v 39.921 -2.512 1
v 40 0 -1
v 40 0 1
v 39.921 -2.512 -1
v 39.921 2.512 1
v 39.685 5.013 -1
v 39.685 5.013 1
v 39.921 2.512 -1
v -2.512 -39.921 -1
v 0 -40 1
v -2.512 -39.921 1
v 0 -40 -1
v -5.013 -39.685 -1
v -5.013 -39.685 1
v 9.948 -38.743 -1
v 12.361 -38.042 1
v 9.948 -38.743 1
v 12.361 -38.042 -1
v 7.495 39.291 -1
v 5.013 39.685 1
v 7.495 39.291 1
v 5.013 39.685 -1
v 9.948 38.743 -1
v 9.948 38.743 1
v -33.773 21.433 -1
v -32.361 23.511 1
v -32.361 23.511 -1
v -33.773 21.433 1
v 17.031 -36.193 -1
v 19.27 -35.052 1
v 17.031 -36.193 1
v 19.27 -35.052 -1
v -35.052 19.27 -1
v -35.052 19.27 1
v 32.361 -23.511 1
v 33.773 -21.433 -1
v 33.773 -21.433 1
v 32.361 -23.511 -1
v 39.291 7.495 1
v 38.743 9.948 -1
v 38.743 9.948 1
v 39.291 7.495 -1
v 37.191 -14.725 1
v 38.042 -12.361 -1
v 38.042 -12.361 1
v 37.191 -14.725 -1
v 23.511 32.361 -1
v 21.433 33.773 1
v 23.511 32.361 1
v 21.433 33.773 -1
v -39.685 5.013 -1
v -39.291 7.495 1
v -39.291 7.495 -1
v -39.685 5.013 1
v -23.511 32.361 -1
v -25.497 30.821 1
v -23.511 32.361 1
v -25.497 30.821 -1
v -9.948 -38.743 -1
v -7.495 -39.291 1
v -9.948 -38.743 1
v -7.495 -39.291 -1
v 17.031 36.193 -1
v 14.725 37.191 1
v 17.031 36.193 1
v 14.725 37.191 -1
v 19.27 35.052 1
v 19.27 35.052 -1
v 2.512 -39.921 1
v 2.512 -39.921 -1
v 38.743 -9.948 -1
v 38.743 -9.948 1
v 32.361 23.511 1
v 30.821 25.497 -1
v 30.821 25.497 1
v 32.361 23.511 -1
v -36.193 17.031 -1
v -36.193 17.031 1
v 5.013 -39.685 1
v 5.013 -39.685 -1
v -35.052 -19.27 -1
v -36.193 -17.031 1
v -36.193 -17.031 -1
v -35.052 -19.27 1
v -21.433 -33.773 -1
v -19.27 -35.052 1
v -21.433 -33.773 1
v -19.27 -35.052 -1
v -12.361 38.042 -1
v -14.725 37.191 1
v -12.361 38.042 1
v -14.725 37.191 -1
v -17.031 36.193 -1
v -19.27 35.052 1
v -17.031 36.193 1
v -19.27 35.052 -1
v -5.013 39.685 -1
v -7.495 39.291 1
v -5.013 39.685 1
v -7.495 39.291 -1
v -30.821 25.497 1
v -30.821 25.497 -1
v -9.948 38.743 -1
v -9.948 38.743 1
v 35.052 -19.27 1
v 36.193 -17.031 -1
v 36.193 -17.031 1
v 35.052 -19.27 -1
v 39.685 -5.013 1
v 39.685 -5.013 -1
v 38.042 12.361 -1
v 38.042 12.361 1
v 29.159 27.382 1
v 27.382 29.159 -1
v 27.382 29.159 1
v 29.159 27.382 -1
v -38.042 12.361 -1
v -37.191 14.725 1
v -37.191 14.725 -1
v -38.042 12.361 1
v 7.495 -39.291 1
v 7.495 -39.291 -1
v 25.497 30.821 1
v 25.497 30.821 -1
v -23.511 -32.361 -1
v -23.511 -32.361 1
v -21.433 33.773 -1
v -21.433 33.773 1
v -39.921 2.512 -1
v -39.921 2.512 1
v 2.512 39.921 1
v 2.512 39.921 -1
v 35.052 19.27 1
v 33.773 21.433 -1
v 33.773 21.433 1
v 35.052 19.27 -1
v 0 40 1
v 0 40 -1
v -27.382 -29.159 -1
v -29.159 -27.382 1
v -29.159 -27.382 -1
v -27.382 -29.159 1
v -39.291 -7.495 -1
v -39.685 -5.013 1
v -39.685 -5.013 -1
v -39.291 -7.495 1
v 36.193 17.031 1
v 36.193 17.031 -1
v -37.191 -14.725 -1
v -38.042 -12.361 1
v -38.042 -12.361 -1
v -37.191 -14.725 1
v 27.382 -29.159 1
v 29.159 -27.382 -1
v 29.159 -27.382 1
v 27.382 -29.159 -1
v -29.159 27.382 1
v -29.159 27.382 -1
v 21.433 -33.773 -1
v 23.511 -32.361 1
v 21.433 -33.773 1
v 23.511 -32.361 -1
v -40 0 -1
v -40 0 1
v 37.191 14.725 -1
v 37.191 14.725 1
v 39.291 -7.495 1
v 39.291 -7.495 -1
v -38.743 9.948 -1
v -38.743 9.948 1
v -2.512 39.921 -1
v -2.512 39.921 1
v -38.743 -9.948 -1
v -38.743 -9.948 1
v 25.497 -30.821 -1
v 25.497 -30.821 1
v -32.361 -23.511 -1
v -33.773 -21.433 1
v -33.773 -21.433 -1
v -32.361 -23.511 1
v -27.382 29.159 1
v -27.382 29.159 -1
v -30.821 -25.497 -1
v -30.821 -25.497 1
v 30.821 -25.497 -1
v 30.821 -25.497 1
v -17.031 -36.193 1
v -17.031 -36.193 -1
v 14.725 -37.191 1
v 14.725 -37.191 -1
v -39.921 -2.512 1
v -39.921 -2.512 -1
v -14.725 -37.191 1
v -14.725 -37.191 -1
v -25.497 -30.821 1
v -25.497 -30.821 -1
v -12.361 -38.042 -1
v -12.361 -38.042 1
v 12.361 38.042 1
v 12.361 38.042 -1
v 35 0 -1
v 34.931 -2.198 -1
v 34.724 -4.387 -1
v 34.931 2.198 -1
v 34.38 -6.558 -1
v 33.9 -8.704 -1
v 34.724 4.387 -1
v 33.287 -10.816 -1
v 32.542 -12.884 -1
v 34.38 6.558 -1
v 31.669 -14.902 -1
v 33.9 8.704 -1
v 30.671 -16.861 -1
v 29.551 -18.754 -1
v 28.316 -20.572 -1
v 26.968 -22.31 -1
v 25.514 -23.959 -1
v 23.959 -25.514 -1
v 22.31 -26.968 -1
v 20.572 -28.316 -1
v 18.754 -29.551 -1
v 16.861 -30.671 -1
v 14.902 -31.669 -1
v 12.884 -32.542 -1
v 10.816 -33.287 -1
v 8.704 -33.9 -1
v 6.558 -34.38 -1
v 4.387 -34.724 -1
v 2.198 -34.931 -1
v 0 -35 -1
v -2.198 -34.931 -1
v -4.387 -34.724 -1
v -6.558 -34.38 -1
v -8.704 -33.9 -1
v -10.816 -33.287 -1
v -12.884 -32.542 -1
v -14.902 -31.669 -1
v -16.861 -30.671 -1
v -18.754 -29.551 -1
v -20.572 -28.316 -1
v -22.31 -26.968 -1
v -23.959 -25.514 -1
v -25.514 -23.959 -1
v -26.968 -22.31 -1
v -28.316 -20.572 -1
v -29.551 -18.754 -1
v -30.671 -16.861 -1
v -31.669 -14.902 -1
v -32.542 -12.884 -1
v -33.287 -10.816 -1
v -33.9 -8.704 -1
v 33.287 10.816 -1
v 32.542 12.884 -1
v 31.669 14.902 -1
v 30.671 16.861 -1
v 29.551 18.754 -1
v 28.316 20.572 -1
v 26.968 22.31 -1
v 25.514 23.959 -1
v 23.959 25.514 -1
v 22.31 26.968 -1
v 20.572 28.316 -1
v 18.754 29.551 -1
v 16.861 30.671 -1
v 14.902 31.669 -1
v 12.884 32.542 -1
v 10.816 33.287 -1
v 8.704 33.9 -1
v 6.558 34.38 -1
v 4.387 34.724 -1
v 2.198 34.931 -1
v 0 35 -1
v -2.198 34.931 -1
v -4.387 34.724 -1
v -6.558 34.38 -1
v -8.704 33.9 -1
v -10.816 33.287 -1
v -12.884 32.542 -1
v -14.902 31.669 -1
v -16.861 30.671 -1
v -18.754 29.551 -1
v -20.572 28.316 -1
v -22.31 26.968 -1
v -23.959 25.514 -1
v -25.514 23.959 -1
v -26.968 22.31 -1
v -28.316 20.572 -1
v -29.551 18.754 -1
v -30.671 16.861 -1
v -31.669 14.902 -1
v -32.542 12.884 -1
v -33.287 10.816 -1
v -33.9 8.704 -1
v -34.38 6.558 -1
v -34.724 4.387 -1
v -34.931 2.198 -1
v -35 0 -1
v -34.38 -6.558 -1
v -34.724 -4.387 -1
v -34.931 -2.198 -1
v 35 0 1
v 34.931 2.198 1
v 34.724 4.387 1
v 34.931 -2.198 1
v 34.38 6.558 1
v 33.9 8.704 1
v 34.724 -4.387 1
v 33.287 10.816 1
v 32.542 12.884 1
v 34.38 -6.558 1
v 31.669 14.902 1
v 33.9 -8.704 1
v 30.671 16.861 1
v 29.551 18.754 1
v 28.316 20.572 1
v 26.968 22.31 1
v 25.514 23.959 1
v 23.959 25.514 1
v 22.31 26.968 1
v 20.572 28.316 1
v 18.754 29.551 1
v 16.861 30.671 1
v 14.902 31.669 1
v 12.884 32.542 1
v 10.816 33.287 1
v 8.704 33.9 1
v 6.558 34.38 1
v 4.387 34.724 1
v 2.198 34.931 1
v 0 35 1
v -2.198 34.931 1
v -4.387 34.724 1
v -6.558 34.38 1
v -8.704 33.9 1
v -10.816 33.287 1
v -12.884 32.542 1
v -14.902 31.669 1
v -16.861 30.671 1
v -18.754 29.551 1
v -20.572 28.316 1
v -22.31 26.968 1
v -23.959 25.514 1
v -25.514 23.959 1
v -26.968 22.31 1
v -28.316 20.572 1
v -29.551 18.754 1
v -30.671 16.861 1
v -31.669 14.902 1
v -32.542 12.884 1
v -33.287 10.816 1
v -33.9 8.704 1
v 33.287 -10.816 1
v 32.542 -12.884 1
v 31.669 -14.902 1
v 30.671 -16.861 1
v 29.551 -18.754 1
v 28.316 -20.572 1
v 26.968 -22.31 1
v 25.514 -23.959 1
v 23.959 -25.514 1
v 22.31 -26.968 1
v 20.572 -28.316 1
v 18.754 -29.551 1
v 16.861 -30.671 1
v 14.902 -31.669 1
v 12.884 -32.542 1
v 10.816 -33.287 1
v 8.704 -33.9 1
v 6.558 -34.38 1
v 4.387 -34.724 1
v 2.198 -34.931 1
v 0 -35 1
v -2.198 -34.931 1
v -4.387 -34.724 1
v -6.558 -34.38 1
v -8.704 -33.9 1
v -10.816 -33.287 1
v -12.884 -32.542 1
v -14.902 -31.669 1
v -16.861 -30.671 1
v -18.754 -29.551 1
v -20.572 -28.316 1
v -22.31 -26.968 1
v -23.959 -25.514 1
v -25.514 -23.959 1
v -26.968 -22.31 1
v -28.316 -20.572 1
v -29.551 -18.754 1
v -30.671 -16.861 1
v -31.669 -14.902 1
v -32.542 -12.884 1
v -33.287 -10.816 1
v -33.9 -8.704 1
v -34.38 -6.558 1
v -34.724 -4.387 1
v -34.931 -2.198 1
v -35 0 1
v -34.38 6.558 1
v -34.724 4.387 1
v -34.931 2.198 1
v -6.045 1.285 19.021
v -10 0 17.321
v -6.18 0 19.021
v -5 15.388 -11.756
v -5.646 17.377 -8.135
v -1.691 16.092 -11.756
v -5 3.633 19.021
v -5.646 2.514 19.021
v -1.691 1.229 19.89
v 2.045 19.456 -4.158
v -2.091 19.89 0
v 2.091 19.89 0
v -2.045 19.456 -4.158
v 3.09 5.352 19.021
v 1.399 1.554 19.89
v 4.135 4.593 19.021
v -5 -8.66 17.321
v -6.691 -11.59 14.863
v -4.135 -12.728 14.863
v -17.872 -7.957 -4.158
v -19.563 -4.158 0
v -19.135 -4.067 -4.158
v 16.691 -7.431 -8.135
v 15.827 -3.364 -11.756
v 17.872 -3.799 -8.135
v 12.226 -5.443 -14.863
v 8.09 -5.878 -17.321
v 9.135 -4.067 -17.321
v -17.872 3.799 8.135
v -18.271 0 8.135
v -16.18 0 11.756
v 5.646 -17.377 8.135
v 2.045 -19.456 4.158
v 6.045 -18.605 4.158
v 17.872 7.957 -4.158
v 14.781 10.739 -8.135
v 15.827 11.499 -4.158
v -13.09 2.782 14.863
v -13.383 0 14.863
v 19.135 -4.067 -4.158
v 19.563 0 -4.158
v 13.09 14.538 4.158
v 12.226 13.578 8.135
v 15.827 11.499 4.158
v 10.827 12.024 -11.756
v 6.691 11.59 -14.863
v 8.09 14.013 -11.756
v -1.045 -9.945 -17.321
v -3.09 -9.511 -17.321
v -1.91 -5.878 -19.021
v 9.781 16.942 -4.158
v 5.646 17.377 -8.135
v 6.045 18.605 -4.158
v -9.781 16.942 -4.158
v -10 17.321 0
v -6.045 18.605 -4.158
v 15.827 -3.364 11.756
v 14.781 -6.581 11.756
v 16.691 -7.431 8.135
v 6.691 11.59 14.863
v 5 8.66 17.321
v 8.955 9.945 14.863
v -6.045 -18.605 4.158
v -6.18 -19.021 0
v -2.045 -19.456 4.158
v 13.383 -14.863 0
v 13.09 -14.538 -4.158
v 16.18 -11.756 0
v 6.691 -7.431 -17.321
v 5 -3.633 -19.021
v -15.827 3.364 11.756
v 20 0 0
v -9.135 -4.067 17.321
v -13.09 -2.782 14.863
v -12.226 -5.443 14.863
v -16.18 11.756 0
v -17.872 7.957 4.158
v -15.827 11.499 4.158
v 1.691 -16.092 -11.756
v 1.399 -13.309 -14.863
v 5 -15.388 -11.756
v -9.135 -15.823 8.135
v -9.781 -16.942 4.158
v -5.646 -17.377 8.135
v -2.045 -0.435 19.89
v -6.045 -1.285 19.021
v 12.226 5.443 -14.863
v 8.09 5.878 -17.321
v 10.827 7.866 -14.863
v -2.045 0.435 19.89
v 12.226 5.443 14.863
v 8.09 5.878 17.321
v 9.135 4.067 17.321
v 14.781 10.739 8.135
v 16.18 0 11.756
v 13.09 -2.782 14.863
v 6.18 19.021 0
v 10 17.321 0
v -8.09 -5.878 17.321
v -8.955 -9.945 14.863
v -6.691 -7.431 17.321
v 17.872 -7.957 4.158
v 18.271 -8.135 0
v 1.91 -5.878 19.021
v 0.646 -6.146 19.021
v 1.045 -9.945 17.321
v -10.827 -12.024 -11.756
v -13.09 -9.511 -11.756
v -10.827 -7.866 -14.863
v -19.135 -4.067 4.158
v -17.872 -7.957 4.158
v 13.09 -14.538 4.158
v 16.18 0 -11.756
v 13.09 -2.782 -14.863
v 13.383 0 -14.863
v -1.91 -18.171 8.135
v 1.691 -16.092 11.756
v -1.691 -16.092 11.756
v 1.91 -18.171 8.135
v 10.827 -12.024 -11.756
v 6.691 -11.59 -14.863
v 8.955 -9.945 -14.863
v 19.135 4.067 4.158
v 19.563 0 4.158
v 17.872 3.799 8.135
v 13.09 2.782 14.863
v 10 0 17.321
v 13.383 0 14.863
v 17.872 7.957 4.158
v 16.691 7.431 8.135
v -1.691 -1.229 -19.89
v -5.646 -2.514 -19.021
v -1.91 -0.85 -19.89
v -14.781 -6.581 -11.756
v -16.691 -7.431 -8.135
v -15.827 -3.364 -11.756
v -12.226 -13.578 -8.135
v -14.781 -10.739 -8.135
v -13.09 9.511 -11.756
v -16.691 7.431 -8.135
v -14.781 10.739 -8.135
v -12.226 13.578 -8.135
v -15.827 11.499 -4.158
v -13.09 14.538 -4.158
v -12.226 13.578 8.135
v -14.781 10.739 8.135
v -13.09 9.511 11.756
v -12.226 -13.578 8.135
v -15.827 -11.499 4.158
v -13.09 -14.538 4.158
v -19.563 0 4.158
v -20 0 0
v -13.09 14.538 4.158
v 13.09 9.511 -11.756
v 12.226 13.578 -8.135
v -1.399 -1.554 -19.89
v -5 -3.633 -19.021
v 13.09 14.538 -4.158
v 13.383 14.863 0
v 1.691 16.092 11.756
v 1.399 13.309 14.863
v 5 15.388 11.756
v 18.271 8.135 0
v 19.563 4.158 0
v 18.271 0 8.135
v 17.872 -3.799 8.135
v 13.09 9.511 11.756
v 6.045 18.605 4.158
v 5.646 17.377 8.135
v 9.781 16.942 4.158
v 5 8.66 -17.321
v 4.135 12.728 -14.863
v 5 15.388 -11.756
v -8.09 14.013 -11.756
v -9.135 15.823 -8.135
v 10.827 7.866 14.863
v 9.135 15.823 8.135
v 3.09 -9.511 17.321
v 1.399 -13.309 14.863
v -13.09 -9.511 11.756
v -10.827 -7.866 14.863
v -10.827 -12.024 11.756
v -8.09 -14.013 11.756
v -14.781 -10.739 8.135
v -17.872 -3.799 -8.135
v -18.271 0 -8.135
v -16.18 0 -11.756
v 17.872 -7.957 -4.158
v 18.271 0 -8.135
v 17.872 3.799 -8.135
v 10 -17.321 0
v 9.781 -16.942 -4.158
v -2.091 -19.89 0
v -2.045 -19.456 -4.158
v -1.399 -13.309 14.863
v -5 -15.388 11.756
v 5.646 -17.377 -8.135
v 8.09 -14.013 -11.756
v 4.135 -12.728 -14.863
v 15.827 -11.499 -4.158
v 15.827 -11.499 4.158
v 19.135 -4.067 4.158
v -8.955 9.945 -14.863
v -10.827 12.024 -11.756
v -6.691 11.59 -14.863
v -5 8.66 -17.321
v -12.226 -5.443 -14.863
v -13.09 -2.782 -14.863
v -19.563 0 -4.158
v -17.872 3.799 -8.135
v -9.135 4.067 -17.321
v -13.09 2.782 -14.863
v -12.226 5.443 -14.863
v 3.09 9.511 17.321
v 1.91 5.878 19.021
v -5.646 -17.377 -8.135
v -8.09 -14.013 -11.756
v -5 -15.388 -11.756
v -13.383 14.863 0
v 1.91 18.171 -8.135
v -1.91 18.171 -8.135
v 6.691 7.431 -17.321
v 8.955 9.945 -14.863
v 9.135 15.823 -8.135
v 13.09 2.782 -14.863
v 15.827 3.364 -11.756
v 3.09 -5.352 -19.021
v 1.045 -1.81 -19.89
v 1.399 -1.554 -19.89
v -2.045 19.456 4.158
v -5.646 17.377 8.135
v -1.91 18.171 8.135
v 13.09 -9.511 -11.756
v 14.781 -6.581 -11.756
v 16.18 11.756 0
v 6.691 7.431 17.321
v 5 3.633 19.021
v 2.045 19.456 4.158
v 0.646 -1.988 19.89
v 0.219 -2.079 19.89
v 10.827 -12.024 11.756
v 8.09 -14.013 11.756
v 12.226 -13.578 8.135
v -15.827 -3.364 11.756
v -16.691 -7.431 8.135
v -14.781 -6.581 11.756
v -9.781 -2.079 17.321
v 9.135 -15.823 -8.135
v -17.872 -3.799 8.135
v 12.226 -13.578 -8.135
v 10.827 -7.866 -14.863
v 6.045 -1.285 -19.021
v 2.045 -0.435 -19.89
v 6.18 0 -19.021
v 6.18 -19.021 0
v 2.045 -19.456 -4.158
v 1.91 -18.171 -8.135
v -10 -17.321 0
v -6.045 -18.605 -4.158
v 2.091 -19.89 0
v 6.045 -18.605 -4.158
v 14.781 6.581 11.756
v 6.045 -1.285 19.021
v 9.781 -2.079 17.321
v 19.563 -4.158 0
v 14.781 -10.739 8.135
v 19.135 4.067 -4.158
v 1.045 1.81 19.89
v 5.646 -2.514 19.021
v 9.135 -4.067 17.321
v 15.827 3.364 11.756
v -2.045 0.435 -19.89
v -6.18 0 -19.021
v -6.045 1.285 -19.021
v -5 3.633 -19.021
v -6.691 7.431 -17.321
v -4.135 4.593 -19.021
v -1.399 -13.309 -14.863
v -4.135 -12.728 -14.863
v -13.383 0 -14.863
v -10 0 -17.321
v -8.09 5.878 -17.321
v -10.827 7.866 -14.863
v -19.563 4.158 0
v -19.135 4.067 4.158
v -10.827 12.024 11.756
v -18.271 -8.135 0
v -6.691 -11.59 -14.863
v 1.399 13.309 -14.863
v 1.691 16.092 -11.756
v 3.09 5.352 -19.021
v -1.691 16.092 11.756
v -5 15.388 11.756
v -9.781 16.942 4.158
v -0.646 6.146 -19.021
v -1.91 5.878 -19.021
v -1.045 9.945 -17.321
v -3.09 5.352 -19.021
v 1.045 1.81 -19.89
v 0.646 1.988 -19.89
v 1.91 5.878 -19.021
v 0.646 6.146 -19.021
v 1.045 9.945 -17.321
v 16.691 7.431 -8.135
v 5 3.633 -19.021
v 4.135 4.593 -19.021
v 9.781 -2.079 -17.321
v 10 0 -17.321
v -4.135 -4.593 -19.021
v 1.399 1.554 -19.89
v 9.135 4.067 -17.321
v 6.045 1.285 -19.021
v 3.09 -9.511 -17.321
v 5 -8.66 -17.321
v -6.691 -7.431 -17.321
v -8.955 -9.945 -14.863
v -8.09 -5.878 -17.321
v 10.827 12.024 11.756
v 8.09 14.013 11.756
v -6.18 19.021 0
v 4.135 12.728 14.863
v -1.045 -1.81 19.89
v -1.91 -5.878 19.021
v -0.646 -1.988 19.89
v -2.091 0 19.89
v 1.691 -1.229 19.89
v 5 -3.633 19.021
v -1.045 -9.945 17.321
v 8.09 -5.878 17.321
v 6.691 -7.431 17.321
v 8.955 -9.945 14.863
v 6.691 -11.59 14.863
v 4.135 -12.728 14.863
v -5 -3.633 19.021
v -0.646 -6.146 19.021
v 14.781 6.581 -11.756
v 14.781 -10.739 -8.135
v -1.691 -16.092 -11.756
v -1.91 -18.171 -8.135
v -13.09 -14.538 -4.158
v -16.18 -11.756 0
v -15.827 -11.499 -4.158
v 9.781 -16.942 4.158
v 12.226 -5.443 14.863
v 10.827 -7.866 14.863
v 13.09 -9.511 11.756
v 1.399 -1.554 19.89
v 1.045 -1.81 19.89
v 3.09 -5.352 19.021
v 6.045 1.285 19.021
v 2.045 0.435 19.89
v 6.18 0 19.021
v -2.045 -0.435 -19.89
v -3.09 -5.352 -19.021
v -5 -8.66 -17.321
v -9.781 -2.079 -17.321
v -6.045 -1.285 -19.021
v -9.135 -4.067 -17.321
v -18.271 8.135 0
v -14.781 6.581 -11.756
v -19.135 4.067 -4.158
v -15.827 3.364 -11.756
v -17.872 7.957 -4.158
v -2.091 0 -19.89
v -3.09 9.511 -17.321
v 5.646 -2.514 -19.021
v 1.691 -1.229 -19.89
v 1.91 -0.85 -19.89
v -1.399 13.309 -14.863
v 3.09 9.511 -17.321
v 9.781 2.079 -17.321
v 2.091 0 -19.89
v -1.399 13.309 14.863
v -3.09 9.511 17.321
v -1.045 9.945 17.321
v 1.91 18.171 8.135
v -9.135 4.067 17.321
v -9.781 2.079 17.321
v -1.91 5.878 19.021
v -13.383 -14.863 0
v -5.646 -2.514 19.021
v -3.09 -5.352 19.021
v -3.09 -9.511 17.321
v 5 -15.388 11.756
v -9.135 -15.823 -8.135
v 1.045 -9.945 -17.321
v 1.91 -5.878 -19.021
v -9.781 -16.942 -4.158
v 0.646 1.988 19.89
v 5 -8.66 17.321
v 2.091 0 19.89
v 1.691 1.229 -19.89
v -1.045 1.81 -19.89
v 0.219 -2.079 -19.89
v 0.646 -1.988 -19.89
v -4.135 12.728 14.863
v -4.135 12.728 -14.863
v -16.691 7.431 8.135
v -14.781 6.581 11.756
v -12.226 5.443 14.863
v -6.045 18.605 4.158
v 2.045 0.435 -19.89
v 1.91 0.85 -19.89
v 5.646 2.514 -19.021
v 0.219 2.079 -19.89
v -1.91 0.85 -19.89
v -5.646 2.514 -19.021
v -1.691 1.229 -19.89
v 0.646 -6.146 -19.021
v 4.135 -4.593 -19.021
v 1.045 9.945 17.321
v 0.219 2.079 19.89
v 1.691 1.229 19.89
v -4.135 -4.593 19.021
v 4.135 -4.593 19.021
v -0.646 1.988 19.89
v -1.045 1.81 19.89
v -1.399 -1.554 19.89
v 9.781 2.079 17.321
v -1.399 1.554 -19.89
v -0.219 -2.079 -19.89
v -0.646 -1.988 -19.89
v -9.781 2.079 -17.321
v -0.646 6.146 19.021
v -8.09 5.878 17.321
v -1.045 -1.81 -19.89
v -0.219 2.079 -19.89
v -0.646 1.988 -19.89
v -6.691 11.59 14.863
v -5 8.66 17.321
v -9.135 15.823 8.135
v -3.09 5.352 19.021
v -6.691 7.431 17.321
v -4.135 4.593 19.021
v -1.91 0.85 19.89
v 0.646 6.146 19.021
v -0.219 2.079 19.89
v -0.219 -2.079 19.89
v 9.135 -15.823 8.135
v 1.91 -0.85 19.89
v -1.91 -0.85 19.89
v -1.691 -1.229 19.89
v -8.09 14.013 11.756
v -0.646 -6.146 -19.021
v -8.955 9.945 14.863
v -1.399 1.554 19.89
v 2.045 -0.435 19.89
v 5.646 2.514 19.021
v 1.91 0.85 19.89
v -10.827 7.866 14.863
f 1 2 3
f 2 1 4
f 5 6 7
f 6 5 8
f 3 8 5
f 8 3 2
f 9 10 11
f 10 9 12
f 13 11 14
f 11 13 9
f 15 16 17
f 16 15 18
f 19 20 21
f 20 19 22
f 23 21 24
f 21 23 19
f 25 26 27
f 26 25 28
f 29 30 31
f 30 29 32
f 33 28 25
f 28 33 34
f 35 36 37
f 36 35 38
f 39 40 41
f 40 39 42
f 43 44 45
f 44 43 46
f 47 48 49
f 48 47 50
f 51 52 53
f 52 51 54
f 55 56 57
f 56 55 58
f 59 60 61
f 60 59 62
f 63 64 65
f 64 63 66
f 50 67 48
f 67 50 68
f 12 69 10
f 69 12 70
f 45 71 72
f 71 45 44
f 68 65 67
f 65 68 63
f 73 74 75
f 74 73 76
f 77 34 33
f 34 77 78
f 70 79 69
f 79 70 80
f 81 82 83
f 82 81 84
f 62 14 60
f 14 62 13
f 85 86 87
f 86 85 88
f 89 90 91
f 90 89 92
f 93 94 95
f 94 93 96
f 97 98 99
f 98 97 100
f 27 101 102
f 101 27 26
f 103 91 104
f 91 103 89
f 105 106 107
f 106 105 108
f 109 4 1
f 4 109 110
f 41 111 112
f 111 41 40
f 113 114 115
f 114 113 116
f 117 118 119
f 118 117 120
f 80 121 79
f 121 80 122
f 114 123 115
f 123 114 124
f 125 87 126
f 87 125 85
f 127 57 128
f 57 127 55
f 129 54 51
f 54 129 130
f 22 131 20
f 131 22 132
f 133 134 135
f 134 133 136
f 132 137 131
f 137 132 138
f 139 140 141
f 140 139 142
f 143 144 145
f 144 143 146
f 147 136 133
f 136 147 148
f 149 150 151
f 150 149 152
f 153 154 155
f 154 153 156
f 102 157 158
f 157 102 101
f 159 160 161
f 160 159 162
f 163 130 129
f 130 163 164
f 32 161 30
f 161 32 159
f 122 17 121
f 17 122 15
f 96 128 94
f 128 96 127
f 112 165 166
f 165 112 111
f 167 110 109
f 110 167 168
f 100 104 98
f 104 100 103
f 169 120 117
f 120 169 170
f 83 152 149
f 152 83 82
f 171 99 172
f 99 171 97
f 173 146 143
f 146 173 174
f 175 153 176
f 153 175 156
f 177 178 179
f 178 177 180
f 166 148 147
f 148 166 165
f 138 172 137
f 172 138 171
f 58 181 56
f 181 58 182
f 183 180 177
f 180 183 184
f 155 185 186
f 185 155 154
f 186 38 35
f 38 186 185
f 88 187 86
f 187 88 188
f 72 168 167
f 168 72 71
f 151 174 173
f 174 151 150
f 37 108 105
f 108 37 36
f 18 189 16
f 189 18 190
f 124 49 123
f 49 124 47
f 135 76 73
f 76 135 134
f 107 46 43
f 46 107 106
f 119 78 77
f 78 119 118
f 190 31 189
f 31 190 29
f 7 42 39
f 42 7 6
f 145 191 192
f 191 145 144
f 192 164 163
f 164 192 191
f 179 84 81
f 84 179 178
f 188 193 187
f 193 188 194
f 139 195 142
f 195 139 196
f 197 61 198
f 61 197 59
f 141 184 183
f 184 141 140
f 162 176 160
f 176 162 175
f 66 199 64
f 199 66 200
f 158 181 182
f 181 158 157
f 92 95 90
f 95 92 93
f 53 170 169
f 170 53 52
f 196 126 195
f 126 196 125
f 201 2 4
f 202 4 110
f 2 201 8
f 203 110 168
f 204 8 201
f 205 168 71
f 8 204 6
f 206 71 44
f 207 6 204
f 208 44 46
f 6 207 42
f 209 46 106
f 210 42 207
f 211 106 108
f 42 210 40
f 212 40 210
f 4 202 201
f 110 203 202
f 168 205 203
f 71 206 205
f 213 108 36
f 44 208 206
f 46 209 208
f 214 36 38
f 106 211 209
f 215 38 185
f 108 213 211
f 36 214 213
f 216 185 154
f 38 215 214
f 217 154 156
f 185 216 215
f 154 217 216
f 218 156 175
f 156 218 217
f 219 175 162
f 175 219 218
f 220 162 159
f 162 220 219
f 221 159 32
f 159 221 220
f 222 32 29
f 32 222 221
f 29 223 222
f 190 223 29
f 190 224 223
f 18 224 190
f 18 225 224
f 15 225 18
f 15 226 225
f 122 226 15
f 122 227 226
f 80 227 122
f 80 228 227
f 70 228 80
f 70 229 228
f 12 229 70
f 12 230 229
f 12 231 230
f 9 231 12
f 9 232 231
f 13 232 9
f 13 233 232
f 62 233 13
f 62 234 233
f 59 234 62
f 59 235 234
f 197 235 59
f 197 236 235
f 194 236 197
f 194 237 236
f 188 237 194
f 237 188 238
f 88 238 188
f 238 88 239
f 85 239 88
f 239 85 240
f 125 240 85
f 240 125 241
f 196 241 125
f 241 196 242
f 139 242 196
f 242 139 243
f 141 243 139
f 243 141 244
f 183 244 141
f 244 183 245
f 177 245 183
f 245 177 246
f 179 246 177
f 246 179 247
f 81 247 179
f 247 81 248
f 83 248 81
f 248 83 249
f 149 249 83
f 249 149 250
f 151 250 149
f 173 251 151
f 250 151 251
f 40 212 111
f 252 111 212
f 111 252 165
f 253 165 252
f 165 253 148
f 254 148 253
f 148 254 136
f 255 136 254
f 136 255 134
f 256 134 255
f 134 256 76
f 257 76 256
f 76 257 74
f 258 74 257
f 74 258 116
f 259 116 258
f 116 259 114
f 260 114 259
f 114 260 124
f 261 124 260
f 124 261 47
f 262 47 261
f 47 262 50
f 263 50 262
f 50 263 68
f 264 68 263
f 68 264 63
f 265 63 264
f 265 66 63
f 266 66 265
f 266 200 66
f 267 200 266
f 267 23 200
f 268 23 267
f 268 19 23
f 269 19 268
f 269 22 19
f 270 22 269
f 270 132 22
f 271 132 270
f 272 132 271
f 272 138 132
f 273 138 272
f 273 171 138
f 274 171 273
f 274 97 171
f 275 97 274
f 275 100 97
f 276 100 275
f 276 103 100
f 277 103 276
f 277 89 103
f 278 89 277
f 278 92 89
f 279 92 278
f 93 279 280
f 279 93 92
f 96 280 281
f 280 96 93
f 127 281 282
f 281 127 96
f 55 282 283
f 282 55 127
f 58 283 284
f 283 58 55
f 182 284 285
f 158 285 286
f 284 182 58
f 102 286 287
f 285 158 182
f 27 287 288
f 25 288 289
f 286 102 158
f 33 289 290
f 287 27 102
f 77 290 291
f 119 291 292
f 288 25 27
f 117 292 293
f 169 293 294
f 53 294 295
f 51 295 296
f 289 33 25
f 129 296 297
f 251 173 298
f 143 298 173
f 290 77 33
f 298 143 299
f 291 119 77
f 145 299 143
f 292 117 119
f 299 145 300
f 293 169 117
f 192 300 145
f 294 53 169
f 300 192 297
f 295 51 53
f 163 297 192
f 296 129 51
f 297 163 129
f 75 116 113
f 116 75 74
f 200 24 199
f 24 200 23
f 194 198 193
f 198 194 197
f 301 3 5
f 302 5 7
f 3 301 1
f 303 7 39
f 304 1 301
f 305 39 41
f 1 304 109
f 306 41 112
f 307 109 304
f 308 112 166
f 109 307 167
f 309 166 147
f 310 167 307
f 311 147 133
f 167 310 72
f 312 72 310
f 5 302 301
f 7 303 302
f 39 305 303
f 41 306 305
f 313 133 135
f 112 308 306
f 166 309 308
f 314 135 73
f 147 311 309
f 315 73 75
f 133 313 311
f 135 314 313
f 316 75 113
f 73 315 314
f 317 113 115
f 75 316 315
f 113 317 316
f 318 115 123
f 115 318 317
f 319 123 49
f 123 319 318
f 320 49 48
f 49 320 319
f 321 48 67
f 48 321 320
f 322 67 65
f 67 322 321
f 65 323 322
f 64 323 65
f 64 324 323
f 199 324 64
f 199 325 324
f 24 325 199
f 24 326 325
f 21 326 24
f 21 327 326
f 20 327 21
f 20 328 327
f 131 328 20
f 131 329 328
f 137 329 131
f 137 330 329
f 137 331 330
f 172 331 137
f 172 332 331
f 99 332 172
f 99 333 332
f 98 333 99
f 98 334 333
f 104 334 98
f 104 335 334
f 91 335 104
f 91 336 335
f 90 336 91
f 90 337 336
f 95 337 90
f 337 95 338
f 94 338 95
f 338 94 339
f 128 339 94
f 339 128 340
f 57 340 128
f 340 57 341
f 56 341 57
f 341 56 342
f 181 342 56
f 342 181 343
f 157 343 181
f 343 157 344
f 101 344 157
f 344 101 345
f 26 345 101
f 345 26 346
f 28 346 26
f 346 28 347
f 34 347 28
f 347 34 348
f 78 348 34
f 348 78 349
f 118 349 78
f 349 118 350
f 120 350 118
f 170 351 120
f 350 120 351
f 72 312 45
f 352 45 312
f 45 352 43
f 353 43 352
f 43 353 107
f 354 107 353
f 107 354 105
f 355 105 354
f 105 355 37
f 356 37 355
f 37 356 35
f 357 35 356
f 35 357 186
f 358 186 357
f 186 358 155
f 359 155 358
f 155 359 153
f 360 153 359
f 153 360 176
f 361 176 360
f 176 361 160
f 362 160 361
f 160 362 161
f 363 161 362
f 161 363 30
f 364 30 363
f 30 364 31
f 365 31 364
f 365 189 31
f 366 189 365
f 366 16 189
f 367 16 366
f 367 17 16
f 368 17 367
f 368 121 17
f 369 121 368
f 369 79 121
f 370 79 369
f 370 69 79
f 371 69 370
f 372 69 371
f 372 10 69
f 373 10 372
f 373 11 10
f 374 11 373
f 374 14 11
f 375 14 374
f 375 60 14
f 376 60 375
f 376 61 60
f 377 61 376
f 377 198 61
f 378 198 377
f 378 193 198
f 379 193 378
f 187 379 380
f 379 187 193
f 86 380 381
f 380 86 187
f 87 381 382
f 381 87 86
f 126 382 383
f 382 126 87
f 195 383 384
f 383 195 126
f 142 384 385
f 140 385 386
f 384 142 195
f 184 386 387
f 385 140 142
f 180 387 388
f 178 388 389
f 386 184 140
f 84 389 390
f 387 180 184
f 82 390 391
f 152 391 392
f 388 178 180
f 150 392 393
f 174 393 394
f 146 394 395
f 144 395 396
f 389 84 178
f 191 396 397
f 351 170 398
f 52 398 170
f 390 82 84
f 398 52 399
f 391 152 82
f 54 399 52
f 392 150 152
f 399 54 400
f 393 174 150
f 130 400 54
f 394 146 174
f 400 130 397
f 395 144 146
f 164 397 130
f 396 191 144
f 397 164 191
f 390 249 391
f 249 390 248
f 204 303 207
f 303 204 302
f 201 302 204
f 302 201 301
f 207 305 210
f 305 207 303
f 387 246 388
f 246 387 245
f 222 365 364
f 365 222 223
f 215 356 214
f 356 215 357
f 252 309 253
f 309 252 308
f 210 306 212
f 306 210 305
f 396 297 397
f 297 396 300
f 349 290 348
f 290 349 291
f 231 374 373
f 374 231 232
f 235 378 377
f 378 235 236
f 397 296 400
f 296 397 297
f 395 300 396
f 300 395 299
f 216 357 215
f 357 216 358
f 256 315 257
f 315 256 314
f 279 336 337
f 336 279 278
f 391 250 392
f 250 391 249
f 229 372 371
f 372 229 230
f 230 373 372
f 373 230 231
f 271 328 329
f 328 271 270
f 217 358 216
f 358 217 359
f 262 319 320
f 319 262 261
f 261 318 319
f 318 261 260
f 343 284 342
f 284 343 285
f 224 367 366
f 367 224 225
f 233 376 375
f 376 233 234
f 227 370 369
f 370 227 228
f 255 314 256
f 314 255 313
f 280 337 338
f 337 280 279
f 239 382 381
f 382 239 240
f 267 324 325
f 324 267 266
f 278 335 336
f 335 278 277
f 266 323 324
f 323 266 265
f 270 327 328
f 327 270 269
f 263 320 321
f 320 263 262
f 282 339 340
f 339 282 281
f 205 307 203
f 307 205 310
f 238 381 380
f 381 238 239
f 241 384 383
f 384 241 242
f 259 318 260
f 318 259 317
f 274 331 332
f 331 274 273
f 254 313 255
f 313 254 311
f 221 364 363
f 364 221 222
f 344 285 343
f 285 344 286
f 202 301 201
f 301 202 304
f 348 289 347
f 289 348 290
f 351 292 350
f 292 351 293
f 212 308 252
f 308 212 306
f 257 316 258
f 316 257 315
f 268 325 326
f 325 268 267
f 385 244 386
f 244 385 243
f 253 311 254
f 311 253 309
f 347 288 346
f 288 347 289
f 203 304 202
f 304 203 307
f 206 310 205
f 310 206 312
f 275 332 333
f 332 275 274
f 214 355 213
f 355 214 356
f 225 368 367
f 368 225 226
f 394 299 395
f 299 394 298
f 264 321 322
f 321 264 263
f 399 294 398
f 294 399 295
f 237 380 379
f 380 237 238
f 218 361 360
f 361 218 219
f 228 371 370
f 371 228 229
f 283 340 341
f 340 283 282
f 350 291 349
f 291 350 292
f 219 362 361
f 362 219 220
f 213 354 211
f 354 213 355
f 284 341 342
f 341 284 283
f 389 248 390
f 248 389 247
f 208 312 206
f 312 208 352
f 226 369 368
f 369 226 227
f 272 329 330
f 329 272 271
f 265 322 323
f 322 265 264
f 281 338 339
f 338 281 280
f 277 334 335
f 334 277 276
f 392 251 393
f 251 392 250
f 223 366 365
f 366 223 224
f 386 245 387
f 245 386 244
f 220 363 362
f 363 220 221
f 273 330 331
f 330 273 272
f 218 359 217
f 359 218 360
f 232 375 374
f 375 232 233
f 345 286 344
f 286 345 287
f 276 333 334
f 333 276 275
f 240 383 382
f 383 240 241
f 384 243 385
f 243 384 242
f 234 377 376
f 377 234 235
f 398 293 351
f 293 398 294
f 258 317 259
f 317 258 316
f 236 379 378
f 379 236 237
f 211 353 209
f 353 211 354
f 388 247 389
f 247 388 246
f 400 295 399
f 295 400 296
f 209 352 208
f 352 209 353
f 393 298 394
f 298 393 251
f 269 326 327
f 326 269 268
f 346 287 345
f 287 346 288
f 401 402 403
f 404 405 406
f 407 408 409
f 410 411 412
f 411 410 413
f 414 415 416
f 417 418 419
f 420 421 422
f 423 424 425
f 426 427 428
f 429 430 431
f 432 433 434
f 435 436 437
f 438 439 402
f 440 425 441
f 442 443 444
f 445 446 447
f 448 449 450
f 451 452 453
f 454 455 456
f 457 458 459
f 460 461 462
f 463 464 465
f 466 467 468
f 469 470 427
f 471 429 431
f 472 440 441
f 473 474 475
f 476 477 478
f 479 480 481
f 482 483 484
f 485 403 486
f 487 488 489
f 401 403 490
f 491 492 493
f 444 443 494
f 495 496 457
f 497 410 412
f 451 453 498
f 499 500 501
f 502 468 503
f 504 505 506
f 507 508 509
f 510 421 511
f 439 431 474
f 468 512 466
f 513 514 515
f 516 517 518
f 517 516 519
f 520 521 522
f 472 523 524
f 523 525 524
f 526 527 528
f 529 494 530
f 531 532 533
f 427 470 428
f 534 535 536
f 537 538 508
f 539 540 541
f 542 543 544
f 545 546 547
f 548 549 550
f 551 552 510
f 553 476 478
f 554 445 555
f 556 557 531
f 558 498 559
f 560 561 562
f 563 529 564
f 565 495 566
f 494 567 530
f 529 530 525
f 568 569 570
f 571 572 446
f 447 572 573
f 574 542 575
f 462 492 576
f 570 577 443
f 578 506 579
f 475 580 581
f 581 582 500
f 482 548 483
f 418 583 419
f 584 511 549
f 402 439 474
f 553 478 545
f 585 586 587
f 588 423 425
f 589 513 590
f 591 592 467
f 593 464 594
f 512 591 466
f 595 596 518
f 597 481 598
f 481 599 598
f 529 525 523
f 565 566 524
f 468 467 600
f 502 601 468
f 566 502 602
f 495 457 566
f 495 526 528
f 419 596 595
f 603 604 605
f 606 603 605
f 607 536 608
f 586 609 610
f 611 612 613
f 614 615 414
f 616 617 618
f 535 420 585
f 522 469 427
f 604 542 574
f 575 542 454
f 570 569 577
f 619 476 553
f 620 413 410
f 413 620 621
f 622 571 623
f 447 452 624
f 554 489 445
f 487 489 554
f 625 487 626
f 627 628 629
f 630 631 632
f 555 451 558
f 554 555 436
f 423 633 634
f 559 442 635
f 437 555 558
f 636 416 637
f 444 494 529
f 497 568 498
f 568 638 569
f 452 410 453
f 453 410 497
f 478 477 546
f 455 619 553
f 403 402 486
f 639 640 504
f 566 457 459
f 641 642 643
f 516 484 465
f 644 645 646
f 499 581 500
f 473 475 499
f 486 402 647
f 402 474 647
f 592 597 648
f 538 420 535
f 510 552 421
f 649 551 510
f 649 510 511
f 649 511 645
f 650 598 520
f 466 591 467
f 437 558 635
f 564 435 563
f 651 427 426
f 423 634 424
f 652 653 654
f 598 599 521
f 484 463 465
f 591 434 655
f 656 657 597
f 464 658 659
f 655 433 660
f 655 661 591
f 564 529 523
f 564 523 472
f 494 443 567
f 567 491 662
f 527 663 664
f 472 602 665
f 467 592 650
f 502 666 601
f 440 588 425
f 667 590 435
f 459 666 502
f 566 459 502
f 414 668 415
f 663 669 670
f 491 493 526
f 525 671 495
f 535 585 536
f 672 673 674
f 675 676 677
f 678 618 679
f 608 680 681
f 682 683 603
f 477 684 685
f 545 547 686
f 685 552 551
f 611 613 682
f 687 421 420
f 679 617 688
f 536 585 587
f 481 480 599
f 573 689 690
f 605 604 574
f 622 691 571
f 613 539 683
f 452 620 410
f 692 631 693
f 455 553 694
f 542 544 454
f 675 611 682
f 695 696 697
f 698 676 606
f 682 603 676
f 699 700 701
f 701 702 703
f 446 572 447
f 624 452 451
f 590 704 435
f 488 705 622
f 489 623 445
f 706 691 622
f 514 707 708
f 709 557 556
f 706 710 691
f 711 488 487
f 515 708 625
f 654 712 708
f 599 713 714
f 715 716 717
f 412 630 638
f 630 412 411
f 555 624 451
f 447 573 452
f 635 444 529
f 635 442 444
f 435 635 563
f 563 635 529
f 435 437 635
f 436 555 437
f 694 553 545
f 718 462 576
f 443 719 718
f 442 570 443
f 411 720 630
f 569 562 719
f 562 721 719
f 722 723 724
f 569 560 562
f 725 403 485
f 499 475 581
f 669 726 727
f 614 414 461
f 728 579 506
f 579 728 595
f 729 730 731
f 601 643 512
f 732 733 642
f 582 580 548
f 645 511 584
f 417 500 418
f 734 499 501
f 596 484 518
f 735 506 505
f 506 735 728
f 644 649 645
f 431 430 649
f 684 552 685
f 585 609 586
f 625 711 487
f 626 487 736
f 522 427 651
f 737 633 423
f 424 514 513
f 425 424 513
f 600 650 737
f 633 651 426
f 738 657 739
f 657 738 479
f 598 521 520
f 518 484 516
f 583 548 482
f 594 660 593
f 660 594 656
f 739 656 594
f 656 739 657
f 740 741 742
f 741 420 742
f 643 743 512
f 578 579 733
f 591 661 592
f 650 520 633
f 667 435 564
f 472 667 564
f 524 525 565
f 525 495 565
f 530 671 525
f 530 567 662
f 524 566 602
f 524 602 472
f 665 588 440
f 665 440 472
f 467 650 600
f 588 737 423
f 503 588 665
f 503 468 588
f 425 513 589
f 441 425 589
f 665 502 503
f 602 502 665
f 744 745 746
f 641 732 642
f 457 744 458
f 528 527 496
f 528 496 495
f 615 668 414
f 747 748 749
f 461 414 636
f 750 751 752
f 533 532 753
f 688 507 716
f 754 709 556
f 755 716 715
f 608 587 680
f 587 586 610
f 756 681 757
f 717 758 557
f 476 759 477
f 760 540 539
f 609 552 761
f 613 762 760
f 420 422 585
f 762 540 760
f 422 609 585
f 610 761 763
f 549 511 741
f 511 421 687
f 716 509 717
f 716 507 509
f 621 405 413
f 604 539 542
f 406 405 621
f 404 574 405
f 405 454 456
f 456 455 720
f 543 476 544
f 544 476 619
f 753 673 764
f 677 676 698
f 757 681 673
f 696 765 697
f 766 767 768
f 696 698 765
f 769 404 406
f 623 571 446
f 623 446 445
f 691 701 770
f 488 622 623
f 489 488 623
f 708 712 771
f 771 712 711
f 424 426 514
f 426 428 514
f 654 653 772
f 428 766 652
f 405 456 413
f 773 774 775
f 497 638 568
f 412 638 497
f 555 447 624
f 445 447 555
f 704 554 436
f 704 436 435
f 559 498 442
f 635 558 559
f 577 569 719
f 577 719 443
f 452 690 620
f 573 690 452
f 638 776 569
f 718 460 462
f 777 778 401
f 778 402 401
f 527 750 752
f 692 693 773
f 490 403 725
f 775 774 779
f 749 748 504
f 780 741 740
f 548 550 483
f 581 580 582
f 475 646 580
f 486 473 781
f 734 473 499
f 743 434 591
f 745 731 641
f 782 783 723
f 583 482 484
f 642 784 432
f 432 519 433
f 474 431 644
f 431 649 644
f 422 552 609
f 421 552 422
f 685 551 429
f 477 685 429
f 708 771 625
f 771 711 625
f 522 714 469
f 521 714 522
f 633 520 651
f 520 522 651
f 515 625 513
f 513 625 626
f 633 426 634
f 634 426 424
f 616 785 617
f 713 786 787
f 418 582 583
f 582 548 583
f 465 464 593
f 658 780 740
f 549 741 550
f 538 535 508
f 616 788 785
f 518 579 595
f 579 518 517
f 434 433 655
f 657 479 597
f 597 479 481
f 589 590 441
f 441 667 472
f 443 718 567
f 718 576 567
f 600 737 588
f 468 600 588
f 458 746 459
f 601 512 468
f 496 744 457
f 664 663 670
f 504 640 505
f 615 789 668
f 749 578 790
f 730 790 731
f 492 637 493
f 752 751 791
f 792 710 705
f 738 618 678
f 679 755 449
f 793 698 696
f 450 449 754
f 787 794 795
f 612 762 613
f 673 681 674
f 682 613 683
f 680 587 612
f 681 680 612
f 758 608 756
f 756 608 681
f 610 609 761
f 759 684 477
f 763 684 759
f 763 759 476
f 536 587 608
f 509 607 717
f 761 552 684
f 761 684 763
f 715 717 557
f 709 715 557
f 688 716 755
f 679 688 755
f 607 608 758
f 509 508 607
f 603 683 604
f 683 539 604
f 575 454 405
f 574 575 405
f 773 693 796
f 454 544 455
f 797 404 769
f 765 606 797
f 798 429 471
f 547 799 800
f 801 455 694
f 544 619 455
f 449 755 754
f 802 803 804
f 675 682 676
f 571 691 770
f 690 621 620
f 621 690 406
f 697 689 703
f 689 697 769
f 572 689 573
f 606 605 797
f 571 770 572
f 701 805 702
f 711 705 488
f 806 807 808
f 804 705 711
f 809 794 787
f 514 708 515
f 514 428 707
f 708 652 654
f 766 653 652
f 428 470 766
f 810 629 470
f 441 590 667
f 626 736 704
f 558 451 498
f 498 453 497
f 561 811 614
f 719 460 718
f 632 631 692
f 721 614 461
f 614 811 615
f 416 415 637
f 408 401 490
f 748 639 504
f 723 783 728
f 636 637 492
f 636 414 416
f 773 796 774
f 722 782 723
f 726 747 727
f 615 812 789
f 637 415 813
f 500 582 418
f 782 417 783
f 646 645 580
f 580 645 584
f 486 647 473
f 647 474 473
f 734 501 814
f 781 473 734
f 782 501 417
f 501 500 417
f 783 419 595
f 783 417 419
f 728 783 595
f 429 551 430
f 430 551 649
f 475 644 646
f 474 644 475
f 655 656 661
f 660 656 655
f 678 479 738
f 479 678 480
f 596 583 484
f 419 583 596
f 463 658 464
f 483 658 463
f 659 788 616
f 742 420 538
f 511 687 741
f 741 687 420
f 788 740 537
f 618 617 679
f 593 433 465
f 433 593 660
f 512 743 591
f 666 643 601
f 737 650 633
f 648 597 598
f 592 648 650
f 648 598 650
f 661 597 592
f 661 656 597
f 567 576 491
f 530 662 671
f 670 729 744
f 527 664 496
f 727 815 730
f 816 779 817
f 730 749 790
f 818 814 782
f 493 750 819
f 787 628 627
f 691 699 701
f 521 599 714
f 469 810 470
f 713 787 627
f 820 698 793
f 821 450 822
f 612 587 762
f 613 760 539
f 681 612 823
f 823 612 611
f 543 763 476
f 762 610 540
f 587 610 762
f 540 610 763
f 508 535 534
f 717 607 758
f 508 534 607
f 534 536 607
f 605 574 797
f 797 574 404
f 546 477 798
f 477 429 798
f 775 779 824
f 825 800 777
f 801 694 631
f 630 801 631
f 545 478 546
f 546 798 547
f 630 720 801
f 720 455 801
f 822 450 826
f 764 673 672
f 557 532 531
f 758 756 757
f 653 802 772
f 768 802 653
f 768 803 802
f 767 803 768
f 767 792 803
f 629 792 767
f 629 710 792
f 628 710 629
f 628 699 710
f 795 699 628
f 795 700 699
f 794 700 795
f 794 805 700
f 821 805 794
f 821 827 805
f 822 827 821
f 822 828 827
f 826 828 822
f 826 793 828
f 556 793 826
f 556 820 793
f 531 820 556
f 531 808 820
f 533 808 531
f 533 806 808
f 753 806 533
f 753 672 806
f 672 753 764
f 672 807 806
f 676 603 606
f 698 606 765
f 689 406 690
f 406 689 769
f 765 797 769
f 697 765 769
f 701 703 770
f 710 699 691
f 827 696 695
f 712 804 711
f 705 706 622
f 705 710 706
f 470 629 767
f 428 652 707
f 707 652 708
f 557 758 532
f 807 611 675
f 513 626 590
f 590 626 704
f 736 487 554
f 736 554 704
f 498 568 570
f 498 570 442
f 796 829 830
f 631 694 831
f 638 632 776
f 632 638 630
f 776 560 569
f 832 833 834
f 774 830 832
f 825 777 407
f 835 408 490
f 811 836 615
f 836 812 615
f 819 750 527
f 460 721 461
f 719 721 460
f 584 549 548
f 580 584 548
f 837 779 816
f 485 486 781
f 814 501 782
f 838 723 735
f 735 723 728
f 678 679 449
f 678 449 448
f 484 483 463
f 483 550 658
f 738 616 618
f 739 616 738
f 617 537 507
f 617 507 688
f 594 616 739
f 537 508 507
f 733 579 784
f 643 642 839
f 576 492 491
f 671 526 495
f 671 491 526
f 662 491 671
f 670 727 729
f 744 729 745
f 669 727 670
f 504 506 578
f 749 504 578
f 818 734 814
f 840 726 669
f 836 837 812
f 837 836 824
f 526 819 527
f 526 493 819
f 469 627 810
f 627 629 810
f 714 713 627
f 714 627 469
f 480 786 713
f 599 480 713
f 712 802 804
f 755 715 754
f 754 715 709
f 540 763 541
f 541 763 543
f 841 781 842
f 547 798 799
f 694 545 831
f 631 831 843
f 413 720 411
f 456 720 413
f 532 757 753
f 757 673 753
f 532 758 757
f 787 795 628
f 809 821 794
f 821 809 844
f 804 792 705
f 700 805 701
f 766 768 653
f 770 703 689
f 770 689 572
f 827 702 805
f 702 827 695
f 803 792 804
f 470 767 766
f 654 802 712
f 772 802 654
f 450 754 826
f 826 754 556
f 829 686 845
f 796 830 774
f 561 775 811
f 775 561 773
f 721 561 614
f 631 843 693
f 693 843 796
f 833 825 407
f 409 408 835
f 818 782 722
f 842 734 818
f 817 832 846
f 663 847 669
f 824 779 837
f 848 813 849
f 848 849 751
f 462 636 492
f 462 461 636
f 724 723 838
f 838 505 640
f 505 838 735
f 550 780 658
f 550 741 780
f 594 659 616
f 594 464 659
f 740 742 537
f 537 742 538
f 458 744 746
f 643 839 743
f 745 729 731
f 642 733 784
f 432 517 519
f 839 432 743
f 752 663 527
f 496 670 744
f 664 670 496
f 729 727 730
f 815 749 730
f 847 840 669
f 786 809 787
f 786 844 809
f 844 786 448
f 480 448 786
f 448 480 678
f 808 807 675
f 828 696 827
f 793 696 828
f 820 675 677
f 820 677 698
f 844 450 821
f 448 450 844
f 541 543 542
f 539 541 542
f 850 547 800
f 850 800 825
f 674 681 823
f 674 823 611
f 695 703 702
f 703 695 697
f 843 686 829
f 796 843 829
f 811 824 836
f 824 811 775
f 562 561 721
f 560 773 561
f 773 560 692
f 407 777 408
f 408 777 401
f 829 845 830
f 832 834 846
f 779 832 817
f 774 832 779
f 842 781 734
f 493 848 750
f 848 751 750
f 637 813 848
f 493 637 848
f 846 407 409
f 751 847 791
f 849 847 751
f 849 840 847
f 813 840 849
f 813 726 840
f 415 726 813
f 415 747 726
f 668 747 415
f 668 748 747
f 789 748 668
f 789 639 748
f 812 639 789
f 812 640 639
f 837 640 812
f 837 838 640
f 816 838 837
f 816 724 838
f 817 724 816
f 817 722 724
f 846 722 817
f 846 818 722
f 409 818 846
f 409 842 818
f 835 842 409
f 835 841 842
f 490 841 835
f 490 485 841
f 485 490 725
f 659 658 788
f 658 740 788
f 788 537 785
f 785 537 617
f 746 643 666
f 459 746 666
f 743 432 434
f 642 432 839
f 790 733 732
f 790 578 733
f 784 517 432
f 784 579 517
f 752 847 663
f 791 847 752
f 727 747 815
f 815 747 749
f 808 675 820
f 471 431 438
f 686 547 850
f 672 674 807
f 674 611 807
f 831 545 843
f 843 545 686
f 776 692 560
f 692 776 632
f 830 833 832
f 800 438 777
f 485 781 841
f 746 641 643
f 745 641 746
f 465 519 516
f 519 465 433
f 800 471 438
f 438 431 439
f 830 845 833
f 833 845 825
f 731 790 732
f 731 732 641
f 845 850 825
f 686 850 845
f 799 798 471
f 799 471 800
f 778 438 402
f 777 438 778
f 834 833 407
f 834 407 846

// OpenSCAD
sphere(r = 20);
difference(){
    
    color("LightBlue") cylinder(h = 2, r = 40,center = true, $fn=100);
    
    cylinder(h = 2, r = 35,center = true, $fn=100);
}
